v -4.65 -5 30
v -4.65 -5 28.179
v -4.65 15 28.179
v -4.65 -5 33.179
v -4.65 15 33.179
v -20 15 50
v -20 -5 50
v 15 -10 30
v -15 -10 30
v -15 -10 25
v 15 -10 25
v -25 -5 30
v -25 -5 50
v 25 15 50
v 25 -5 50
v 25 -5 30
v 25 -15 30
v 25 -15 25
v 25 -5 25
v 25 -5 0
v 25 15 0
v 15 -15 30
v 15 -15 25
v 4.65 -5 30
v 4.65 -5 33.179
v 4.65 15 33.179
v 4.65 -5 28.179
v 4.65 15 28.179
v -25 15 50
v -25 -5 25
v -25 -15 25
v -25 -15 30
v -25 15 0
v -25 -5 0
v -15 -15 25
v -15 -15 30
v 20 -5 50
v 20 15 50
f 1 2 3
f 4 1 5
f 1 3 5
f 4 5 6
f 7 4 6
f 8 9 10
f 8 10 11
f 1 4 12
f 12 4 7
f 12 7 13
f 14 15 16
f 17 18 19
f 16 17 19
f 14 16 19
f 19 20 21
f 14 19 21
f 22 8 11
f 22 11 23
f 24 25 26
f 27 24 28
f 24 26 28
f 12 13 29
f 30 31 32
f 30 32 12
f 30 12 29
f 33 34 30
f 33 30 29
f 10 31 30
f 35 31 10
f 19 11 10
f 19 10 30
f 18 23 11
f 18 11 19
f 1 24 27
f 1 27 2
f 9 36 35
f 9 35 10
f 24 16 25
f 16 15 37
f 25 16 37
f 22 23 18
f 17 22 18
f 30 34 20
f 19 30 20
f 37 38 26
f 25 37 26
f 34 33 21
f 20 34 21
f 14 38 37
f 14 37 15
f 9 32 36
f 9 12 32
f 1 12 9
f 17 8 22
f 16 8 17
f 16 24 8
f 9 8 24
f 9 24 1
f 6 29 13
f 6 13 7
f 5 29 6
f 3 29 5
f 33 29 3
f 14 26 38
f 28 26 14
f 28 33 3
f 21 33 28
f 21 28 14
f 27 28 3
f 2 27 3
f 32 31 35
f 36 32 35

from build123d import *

# Parameters (mm, degrees)
F0_W     = 50
F0_H     = 30
F1_DEPTH = 50
F3_DEPTH = 20
F4_DEPTH = 50.001
F6_DEPTH = 25
F8_DEPTH = 20


with BuildPart() as f1:
    # F0 (on Top) → F1 (new body)
    with BuildSketch(Plane.XY):
        Rectangle(F0_W, F0_H)
    extrude(amount=F1_DEPTH)

    # F2 (on face) → F3 (cut)
    with BuildSketch(Plane.XY.offset(50)):
        Polygon((-25, -15), (-15, -15), (-15, -10), (15, -10), (15, -15), (25, -15), (25, -5), (-25, -5), align=None)
    extrude(amount=-F3_DEPTH, mode=Mode.SUBTRACT)

    # F4 (cut, through all): a face of the model
    f4_faces = [f1.faces().sort_by_distance(p)[0] for p in [
        (0, -12.5, 50),
    ]]
    extrude(f4_faces, amount=-F4_DEPTH, mode=Mode.SUBTRACT)

    # F5 (on face) → F6 (cut)
    with BuildSketch(Plane(origin=(0, 0, 0), x_dir=(1, 0, 0), z_dir=(0, 0, -1))):
        Polygon((-25, 15), (-25, 5), (25, 5), (25, 15), (15, 15), (15, 10), (-15, 10), (-15, 15), align=None)
    extrude(amount=-F6_DEPTH, mode=Mode.SUBTRACT)

    # F7 (on face) → F8 (cut)
    with BuildSketch(Plane(origin=(0, 15, 0), x_dir=(-1, 0, 0), z_dir=(0, 1, 0))):
        Polygon((-4.6503130347, 33.1786386669), (-4.6503130347, 28.1786386669), (4.6503130347, 28.1786386669), (4.6503130347, 33.1786386669), (20, 50), (-20, 50), align=None)
    extrude(amount=-F8_DEPTH, mode=Mode.SUBTRACT)


solid = f1.part
